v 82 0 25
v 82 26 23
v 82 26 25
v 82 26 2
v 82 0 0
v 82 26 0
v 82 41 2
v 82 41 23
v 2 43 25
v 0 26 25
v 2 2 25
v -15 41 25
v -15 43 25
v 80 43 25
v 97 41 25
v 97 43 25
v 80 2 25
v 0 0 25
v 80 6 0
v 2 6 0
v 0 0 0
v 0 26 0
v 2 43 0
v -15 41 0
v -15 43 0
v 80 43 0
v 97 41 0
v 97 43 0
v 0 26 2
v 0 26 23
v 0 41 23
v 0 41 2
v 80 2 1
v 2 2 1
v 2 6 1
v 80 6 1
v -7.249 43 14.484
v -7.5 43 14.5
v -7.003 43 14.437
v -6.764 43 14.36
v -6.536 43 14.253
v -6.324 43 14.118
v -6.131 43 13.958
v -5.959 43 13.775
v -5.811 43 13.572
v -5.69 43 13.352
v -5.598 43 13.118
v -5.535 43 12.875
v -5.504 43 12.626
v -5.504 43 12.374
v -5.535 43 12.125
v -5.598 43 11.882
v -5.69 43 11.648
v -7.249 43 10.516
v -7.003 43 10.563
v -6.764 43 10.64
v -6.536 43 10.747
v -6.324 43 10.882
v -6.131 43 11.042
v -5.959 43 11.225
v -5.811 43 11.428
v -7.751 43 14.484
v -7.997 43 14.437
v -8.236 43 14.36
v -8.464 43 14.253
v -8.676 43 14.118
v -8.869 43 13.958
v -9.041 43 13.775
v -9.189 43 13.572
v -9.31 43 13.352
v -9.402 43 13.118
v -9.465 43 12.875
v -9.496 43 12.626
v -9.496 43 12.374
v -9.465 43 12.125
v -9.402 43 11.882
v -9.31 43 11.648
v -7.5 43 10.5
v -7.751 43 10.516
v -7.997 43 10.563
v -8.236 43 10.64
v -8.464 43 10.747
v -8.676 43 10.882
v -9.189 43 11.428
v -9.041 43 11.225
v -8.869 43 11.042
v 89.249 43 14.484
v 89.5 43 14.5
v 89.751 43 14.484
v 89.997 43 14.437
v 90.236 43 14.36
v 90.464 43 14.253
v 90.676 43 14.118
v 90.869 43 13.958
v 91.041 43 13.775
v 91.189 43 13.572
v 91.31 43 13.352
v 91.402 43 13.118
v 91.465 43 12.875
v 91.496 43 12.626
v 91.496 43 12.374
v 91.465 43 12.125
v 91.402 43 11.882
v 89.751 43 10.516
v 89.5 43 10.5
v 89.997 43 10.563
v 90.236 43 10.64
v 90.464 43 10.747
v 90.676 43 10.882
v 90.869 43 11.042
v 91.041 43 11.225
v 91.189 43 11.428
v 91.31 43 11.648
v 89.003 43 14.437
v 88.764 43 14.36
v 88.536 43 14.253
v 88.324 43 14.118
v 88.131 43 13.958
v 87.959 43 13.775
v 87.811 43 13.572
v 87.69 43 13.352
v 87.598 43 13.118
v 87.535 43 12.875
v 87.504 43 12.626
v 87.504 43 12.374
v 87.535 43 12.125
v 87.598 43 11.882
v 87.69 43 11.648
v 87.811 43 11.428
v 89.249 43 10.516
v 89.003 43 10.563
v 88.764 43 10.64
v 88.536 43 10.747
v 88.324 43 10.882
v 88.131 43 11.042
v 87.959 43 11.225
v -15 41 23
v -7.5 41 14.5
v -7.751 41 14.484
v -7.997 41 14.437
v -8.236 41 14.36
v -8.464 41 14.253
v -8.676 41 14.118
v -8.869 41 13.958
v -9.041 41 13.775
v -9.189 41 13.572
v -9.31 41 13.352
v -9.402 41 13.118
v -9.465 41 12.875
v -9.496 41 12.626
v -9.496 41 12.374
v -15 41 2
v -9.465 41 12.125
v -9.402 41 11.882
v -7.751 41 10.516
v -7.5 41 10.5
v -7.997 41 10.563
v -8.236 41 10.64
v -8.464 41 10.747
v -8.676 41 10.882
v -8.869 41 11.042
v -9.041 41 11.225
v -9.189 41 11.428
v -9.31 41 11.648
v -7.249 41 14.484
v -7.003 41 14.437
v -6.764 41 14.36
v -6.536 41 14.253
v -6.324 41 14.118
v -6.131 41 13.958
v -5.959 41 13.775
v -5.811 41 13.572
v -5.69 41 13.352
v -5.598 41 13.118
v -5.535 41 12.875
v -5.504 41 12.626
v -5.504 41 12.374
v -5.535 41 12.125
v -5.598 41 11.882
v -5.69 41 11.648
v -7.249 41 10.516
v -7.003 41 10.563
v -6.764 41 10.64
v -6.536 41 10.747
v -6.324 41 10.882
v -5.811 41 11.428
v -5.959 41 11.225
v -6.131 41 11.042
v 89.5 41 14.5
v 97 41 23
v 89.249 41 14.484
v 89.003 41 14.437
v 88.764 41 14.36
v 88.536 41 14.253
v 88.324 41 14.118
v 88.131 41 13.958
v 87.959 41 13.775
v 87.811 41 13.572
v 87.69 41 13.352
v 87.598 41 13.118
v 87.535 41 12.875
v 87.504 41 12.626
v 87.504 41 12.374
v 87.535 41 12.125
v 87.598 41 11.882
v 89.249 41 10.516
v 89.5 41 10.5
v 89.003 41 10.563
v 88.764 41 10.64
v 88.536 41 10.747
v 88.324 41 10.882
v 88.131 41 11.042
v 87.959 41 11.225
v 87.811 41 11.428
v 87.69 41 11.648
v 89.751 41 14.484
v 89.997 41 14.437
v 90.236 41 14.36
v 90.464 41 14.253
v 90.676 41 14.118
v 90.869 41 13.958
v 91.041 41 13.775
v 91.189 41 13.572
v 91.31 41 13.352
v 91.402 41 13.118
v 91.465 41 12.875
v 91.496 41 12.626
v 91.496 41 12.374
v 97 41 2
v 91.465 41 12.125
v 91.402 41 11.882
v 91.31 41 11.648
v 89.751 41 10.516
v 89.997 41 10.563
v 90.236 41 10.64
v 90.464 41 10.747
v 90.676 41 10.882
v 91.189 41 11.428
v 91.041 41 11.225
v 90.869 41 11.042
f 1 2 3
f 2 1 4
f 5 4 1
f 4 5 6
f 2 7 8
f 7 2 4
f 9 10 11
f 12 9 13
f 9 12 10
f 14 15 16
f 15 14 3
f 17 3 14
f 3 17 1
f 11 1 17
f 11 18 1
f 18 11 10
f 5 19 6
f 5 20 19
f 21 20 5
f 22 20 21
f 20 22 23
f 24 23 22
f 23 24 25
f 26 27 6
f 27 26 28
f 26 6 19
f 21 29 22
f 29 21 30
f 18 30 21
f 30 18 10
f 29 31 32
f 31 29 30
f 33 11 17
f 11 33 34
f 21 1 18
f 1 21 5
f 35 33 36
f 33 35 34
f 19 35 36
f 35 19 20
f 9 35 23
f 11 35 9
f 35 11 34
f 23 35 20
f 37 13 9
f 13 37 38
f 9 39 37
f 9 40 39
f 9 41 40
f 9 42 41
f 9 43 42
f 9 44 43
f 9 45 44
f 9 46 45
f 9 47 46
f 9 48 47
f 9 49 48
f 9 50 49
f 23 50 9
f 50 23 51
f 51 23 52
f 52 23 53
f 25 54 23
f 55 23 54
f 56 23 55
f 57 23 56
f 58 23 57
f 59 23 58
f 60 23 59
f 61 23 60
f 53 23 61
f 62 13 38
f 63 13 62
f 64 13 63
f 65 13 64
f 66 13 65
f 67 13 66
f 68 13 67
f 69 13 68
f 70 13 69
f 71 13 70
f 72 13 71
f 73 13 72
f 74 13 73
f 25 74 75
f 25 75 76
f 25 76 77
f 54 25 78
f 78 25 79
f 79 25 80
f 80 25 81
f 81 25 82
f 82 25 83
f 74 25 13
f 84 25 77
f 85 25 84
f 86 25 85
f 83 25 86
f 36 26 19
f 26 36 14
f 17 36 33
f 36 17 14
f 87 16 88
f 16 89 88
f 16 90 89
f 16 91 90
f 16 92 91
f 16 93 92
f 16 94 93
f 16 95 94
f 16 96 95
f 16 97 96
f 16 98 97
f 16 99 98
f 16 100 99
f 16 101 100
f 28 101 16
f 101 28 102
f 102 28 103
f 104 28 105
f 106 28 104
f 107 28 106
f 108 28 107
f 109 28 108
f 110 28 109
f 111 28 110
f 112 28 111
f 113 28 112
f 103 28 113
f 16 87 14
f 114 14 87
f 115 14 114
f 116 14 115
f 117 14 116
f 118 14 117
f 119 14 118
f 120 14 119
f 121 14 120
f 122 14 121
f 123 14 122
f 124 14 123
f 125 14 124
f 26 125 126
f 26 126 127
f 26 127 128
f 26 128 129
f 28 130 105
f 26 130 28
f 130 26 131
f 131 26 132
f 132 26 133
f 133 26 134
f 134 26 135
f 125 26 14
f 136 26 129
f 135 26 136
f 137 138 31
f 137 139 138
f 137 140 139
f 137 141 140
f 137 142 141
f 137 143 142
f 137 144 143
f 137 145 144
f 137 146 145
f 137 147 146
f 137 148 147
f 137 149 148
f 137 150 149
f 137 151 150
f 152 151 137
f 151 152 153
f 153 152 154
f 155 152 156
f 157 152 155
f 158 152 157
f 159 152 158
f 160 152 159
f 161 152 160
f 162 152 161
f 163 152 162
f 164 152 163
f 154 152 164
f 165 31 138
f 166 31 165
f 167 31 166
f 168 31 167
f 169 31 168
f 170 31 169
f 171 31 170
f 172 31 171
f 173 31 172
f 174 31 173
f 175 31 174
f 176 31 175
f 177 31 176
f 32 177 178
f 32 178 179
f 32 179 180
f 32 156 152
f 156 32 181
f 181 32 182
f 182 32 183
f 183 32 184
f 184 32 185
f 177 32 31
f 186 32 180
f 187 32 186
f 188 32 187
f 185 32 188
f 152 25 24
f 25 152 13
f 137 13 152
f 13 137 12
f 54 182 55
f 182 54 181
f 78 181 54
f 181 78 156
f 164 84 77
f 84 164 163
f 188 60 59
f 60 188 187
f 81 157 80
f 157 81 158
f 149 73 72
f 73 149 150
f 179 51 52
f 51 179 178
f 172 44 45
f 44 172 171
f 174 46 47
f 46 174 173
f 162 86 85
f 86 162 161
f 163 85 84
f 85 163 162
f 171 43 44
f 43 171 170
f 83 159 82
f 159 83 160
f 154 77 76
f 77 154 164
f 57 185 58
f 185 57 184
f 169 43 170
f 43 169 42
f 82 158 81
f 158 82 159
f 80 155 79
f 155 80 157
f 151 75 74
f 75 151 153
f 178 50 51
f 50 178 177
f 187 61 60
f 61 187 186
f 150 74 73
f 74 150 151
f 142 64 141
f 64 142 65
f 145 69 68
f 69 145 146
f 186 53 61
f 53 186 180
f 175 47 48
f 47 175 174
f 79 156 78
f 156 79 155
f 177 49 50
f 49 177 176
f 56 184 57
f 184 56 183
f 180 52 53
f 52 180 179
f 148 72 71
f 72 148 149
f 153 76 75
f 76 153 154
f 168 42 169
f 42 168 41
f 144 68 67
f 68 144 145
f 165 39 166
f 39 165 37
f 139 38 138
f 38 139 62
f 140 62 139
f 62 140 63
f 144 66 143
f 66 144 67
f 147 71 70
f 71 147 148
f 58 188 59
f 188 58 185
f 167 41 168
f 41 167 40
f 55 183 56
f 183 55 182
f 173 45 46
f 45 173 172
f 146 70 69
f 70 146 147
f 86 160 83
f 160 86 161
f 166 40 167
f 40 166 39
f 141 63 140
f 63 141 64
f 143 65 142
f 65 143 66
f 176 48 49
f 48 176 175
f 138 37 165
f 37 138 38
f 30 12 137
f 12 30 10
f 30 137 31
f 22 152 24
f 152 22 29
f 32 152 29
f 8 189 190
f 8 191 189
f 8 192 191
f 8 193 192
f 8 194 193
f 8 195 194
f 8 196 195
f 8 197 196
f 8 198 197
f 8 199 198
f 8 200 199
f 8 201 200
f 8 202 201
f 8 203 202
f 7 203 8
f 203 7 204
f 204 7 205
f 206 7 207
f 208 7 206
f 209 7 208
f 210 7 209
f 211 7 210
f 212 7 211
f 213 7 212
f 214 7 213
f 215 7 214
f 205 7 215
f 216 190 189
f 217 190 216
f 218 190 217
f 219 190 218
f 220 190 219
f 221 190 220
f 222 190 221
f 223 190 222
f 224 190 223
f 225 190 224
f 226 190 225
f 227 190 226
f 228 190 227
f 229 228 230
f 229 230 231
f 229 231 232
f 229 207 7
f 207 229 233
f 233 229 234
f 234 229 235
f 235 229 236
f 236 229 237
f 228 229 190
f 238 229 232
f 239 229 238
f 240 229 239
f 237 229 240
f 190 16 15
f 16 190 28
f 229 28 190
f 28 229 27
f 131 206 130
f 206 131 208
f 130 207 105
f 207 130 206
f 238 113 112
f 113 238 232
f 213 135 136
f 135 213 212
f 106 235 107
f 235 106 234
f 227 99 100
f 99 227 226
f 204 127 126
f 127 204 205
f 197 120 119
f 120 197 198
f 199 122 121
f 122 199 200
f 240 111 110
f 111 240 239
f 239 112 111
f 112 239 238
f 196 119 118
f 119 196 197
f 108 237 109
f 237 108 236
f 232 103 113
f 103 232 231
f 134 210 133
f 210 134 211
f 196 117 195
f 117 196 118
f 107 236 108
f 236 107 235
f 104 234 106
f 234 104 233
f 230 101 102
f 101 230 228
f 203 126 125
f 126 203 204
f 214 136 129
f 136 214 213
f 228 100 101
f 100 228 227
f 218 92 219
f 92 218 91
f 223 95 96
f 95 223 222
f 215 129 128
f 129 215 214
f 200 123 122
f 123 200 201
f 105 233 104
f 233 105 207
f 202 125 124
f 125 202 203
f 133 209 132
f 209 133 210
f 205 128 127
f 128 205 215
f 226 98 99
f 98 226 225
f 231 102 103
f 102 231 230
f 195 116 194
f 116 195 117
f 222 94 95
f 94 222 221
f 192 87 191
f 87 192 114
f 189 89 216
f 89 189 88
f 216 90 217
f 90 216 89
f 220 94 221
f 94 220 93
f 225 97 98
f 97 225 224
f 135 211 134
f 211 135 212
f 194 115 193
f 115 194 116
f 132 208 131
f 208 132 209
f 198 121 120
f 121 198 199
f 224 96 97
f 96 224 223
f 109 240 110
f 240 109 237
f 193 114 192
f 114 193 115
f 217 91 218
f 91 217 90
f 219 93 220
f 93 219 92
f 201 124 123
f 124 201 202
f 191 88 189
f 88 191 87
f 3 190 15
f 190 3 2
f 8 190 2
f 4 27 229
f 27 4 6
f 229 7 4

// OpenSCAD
// file: ../common/prism.scad
module prism(l, w, h){
   polyhedron(
           points=[[0,0,0], [l,0,0], [l,w,0], [0,w,0], [0,w,h], [l,w,h]],
           faces=[[0,1,2,3],[5,4,3,2],[0,4,5,1],[0,3,4],[5,2,1]]
           );
}
// main file
include <../common/prism.scad>

POWER_SUPPLY_WIDTH = 78;
POWER_SUPPLY_HEIGHT = 41;

BRACKET_THICKNESS = 2;
BLOCKING_PART_HEIGHT = 4;
BLOCKING_PART_THICKNESS = 1;

BRACKET_LENGTH = 25;
SIDE_WIDTH = 15;

SIDE_HOLE_DIAM = 4;


module u_bracket() {
cube([POWER_SUPPLY_WIDTH + 2 * BRACKET_THICKNESS, BRACKET_THICKNESS, BRACKET_LENGTH]);
cube([POWER_SUPPLY_WIDTH + 2 * BRACKET_THICKNESS, BRACKET_THICKNESS + BLOCKING_PART_HEIGHT, BLOCKING_PART_THICKNESS]);

/* Side parts */
cube([BRACKET_THICKNESS, POWER_SUPPLY_HEIGHT + BRACKET_THICKNESS, BRACKET_LENGTH]);
translate([POWER_SUPPLY_WIDTH + BRACKET_THICKNESS, 0, 0]) cube([BRACKET_THICKNESS, POWER_SUPPLY_HEIGHT + BRACKET_THICKNESS, BRACKET_LENGTH]);
}

module bracket_side()
{
    difference() {
        cube([BRACKET_LENGTH, SIDE_WIDTH, BRACKET_THICKNESS]);
        translate([BRACKET_LENGTH/2, SIDE_WIDTH/2, 0]) cylinder(d = SIDE_HOLE_DIAM, h = BRACKET_THICKNESS, $fn = 50);
    }
    translate([0, 0, BRACKET_THICKNESS]) prism(BRACKET_THICKNESS, SIDE_WIDTH, SIDE_WIDTH);

    translate([BRACKET_LENGTH - BRACKET_THICKNESS, 0, BRACKET_THICKNESS]) prism(BRACKET_THICKNESS, SIDE_WIDTH, SIDE_WIDTH);
}

u_bracket();
translate([-SIDE_WIDTH, POWER_SUPPLY_HEIGHT + BRACKET_THICKNESS, BRACKET_LENGTH]) rotate([0, 90, -90]) bracket_side();
translate([SIDE_WIDTH + POWER_SUPPLY_WIDTH + 2 * BRACKET_THICKNESS, POWER_SUPPLY_HEIGHT + BRACKET_THICKNESS, BRACKET_LENGTH]) mirror([1, 0, 0]) rotate([0, 90, -90]) bracket_side();
